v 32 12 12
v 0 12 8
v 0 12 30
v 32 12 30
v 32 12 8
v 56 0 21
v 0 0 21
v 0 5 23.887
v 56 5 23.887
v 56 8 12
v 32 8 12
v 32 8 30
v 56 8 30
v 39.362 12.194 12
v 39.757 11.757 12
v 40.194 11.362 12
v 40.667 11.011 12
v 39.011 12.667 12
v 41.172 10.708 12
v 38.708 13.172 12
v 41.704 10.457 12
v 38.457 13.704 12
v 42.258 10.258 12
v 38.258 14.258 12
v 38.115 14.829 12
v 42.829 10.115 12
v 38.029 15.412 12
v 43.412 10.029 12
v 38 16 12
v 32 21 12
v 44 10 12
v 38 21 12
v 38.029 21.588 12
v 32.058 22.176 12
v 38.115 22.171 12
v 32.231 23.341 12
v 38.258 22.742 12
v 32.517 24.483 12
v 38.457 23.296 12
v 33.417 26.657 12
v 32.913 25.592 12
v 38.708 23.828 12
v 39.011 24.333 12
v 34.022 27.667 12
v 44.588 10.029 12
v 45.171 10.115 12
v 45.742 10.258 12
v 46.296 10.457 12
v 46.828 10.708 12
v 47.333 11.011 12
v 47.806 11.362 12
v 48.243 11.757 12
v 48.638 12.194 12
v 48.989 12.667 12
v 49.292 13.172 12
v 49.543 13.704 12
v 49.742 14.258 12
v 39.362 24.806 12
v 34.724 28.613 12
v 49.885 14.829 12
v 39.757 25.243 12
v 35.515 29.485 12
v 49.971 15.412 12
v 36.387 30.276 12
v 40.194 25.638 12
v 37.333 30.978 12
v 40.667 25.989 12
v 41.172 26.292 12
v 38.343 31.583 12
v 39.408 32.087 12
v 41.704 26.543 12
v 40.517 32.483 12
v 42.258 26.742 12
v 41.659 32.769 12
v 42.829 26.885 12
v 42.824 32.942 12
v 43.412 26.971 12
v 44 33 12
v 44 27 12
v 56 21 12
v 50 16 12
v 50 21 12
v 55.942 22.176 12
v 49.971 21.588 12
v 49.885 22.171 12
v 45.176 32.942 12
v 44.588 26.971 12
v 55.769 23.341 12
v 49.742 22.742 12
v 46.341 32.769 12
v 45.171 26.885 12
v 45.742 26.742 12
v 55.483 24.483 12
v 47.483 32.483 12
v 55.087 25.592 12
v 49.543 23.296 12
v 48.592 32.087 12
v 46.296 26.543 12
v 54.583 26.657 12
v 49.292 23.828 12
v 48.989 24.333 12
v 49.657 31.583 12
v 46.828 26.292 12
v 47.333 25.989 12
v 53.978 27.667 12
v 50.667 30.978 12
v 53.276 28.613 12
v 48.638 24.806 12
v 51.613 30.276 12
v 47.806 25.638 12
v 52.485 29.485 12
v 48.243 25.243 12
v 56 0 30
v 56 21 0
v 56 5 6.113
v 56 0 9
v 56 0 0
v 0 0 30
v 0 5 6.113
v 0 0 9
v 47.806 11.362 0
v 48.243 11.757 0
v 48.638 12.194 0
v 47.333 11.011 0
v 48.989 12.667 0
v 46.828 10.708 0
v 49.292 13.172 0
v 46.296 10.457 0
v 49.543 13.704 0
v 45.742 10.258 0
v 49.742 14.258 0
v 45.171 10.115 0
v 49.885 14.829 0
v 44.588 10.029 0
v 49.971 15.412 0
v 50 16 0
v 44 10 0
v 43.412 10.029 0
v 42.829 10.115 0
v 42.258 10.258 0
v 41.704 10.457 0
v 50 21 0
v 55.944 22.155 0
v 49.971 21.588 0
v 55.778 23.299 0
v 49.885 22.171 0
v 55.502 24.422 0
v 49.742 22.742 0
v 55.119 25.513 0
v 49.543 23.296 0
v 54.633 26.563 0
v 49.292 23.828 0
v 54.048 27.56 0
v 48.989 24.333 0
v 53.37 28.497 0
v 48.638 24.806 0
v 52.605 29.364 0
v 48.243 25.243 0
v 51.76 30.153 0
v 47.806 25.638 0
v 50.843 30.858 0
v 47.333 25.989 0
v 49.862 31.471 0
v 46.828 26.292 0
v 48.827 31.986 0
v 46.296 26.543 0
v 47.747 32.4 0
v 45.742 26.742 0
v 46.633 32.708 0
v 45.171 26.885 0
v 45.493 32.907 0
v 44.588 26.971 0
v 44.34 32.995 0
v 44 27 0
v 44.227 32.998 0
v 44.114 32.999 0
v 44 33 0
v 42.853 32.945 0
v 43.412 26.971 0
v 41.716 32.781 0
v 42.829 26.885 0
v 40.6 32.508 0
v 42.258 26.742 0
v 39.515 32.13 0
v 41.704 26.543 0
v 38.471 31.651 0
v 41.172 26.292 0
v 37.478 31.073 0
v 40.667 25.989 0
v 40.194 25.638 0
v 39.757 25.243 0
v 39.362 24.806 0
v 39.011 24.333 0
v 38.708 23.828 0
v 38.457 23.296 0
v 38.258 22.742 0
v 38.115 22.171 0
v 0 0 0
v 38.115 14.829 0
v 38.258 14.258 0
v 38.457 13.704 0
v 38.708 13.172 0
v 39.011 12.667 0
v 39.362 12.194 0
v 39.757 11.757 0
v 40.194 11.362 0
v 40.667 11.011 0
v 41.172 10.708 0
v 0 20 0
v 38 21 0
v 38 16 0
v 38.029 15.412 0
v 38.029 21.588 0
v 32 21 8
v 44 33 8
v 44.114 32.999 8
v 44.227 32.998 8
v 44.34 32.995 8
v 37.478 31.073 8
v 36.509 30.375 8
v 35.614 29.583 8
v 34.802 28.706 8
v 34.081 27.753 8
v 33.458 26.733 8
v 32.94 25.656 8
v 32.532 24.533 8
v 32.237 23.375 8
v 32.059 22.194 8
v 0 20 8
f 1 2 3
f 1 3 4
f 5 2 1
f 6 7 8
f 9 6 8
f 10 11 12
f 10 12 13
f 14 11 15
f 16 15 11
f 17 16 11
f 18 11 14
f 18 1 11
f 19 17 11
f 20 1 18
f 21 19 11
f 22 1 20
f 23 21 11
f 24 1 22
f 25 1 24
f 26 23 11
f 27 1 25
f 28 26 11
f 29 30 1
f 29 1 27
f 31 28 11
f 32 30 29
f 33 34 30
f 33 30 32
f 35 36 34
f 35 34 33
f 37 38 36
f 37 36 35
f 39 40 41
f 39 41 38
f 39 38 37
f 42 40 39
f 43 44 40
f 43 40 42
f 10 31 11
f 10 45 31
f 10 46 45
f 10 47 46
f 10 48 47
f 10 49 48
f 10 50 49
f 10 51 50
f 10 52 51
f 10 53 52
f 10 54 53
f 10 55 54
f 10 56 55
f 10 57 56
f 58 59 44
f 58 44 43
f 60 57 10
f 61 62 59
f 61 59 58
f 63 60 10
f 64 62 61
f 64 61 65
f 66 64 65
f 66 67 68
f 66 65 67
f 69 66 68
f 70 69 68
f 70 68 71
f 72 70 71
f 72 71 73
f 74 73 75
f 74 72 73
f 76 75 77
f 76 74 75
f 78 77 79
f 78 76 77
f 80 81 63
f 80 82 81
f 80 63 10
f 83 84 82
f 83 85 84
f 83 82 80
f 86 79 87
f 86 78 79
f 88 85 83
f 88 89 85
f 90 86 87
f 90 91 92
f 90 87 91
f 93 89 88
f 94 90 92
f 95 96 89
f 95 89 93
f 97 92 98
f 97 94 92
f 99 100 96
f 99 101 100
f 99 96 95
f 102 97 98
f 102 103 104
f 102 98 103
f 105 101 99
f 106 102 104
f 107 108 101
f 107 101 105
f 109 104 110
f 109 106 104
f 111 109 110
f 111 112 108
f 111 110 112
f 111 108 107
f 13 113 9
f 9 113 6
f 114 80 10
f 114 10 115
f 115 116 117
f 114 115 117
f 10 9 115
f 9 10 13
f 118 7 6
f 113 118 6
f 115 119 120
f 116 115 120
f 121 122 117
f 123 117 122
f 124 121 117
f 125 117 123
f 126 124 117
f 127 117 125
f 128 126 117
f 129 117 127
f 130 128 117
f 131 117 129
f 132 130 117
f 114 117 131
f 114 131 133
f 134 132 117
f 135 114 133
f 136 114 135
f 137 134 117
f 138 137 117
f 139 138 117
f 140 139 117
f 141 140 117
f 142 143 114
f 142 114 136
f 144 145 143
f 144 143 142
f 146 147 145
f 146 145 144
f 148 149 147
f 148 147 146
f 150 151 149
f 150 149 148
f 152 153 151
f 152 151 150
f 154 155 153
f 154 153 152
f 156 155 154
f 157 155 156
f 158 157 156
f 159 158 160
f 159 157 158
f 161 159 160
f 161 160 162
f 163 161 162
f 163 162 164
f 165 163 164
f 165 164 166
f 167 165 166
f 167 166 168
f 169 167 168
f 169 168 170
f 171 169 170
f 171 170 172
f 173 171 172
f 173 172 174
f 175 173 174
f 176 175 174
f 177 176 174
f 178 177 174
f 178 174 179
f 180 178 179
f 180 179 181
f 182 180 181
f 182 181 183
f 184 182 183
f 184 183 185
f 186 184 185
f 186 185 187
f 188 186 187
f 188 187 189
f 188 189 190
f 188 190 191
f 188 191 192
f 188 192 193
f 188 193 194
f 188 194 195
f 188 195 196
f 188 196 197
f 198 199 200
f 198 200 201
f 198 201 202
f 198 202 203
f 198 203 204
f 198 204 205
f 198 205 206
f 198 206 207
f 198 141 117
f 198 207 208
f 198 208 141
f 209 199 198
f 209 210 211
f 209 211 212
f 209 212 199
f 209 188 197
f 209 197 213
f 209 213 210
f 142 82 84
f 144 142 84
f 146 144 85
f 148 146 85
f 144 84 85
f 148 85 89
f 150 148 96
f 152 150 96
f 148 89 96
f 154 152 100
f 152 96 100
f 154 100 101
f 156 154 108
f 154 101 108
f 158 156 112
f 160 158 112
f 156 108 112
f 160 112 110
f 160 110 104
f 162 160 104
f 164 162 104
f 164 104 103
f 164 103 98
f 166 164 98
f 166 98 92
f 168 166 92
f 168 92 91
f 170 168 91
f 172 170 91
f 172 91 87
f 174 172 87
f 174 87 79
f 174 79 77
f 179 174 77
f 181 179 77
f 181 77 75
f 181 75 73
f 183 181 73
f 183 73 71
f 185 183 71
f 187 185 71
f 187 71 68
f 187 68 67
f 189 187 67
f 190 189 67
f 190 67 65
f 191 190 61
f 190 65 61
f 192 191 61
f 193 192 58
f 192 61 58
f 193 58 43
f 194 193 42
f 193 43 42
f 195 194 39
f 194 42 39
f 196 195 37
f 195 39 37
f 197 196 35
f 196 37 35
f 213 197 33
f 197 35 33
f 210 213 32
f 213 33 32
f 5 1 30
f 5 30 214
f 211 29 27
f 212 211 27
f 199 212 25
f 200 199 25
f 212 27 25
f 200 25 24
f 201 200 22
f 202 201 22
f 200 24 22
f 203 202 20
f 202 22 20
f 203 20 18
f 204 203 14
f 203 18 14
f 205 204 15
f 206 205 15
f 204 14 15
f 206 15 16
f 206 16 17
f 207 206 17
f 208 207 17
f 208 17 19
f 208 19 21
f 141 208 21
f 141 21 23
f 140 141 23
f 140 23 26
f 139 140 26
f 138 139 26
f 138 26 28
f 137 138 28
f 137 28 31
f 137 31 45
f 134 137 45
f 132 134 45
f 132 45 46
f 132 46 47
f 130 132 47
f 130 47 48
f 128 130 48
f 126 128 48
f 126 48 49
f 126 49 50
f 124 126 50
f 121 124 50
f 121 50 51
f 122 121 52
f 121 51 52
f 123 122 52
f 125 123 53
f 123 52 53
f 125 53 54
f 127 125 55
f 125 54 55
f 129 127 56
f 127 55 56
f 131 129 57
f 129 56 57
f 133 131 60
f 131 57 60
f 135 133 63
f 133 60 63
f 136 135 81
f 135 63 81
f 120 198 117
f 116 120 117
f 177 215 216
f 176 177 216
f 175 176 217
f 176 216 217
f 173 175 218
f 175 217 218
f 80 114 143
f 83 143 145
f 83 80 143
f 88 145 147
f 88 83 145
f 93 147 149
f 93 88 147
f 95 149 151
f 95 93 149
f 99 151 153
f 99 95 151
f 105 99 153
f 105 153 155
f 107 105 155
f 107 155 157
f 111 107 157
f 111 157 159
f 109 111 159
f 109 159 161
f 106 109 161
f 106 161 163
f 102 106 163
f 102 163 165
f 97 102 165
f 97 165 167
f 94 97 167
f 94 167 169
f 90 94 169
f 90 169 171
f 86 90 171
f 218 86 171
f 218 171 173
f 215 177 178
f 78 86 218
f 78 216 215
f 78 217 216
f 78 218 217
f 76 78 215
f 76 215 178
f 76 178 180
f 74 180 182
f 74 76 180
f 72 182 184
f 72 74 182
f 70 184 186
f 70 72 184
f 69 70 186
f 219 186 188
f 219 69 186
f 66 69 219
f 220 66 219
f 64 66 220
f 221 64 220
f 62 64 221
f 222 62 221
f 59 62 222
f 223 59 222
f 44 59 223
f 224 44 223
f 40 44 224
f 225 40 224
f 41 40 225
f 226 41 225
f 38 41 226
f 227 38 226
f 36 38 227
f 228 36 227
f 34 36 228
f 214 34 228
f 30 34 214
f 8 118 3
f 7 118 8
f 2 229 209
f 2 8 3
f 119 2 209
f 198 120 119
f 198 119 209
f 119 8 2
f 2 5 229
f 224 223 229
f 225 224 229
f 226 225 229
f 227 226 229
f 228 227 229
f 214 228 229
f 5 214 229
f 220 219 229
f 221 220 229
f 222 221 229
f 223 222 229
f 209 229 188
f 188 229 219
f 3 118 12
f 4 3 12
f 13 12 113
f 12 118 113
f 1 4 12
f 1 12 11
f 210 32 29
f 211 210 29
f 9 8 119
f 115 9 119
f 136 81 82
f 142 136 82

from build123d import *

# Parameters (mm, degrees)
SKETCH_2_W          = 56
SKETCH_2_H          = 30
EXTRUDE_2_DEPTH     = 12
CUT_EXTRUDE_1_DEPTH = 65.652919501
SKETCH_6_W          = 24
SKETCH_6_H          = 30
CUT_EXTRUDE_2_DEPTH = 4
SKETCH_8_W          = 10
SKETCH_8_H          = 8
EXTRUDE_1_DEPTH     = 8
SKETCH_9_W          = 24
SKETCH_9_H          = 12
EXTRUDE_3_DEPTH     = 13
SKETCH_10_R         = 12
EXTRUDE_4_DEPTH     = 12
EXTRUDE_START       = -8
EXTRUDE_5_DEPTH     = 8
CUT_EXTRUDE_3_DEPTH = 68.446274916


with BuildPart() as part:
    # 草图2 → 凸台-拉伸2 (new body)
    with BuildSketch(Plane(origin=(0, 0, 0), x_dir=(1, 0, 0), z_dir=(0, 1, 0))):
        with Locations((28, -15)):
            Rectangle(SKETCH_2_W, SKETCH_2_H)
    extrude(amount=EXTRUDE_2_DEPTH)

    # 草图4 → 切除-拉伸1 (cut, through all)
    with BuildSketch(Plane.ZY):
        Polygon((9, 0), (21, 0), (23.886751346, 5), (6.113248654, 5), align=None)
    extrude(amount=-CUT_EXTRUDE_1_DEPTH, mode=Mode.SUBTRACT)

    # 草图6 → 切除-拉伸2 (cut)
    with BuildSketch(Plane(origin=(0, 12, 0), x_dir=(1, 0, 0), z_dir=(0, 1, 0))):
        with Locations((44, -15)):
            Rectangle(SKETCH_6_W, SKETCH_6_H)
    extrude(amount=-CUT_EXTRUDE_2_DEPTH, mode=Mode.SUBTRACT)

    # 草图8 → 拉伸-薄壁1 (add)
    with BuildSketch(Plane(origin=(0, 12, 0), x_dir=(1, 0, 0), z_dir=(0, 1, 0))):
        with Locations((5, -4)):
            Rectangle(SKETCH_8_W, SKETCH_8_H)
    extrude(amount=EXTRUDE_1_DEPTH)

    # 草图9 → 凸台-拉伸3 (add)
    with BuildSketch(Plane(origin=(0, 8, 0), x_dir=(1, 0, 0), z_dir=(0, 1, 0))):
        with Locations((44, -6)):
            Rectangle(SKETCH_9_W, SKETCH_9_H)
    extrude(amount=EXTRUDE_3_DEPTH)

    # 草图10 → 凸台-拉伸4 (add)
    with BuildSketch(Plane.XY.offset(12)):
        with Locations((44, 21)):
            Circle(SKETCH_10_R)
    extrude(amount=-EXTRUDE_4_DEPTH)

    # 草图13 → 凸台-拉伸5 (add)
    with BuildSketch(Plane(origin=(0, 0, 0), x_dir=(-1, 0, 0), z_dir=(0, 0, -1)).offset(EXTRUDE_START)):
        with BuildLine():
            Line((0, 20), (-44, 33))
            ThreePointArc((-44, 33), (-44.170266358, 32.998791996), (-44.340498436, 32.995168228))
            Line((-44.340498436, 32.995168228), (-44, 10))
            Line((-44, 10), (0, 10))
            Line((0, 10), (0, 20))
        make_face()
    extrude(amount=EXTRUDE_5_DEPTH)

    # 草图14 → 切除-拉伸3 (cut, through all)
    with BuildSketch(Plane.XY.offset(12)):
        with BuildLine():
            Line((38, 21), (38, 16))
            ThreePointArc((38, 16), (44, 10), (50, 16))
            Line((50, 16), (50, 21))
            ThreePointArc((50, 21), (44, 27), (38, 21))
        make_face()
    extrude(amount=-CUT_EXTRUDE_3_DEPTH, mode=Mode.SUBTRACT)


solid = part.part
